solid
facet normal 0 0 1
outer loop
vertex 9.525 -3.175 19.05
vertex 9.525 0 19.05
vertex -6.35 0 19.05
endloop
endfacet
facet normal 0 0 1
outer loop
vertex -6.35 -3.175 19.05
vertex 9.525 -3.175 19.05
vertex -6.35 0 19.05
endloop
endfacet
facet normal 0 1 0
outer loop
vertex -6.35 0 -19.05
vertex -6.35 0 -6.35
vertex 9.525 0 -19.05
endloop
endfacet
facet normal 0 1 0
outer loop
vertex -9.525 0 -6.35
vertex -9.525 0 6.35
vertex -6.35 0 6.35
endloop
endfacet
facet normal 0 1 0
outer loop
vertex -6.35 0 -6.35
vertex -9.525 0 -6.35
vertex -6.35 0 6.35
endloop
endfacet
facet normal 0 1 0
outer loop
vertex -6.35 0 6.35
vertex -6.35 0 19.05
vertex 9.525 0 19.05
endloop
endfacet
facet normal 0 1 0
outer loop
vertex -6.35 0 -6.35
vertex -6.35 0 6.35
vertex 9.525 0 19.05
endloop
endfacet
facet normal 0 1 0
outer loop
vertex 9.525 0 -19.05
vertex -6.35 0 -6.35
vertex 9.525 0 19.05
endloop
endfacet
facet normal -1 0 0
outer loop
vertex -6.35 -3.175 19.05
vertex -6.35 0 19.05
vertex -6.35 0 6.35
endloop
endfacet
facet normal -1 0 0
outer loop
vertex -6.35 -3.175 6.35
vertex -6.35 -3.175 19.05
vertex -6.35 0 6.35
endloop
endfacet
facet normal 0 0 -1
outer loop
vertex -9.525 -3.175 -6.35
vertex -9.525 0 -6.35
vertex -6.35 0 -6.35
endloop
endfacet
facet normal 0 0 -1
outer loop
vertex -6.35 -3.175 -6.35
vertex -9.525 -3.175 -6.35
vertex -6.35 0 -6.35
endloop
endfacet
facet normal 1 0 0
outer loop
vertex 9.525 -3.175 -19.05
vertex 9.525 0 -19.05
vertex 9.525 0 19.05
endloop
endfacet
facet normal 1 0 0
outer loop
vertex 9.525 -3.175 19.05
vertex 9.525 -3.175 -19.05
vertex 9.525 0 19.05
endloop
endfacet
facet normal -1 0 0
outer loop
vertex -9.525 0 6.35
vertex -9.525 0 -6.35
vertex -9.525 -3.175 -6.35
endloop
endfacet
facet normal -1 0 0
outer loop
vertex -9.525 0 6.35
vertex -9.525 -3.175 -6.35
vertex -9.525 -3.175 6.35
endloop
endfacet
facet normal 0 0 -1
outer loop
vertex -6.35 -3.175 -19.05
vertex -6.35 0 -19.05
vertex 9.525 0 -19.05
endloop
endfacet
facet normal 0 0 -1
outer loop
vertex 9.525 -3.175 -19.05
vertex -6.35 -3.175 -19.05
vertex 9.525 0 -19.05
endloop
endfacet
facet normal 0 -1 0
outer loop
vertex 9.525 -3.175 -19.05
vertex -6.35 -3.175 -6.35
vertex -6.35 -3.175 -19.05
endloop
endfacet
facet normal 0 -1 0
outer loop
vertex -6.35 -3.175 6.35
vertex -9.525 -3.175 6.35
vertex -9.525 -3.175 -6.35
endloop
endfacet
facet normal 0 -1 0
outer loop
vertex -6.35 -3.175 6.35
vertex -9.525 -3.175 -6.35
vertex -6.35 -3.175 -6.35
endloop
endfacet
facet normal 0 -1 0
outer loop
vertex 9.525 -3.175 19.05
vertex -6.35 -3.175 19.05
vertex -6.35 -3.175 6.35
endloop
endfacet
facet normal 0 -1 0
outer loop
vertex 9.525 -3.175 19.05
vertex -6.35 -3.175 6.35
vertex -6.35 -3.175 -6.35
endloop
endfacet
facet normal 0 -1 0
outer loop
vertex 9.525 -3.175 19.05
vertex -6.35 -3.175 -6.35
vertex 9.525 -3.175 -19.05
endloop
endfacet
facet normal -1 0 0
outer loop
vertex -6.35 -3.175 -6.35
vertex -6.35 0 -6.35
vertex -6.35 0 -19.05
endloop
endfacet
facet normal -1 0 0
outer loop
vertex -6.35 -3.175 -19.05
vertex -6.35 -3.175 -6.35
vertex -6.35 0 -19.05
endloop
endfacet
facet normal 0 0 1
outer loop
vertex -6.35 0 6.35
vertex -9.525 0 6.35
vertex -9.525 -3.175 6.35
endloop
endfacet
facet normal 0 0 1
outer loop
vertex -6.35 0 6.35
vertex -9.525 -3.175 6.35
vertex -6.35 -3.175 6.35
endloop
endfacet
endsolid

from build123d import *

# Parameters (mm, degrees)
F0_W     = 3.175
F0_H     = 12.7
F1_DEPTH = 3.175


with BuildPart() as f1:
    # F0 (on Front) → F1 (new body)
    with BuildSketch(Plane.XZ):
        with Locations((-7.9375, 0)):
            Rectangle(F0_W, F0_H)
        Polygon((9.525, -19.05), (9.525, 19.05), (-6.35, 19.05), (-6.35, 6.35), (-6.35, -6.35), (-6.35, -19.05), align=None)
    extrude(amount=F1_DEPTH)


solid = f1.part
